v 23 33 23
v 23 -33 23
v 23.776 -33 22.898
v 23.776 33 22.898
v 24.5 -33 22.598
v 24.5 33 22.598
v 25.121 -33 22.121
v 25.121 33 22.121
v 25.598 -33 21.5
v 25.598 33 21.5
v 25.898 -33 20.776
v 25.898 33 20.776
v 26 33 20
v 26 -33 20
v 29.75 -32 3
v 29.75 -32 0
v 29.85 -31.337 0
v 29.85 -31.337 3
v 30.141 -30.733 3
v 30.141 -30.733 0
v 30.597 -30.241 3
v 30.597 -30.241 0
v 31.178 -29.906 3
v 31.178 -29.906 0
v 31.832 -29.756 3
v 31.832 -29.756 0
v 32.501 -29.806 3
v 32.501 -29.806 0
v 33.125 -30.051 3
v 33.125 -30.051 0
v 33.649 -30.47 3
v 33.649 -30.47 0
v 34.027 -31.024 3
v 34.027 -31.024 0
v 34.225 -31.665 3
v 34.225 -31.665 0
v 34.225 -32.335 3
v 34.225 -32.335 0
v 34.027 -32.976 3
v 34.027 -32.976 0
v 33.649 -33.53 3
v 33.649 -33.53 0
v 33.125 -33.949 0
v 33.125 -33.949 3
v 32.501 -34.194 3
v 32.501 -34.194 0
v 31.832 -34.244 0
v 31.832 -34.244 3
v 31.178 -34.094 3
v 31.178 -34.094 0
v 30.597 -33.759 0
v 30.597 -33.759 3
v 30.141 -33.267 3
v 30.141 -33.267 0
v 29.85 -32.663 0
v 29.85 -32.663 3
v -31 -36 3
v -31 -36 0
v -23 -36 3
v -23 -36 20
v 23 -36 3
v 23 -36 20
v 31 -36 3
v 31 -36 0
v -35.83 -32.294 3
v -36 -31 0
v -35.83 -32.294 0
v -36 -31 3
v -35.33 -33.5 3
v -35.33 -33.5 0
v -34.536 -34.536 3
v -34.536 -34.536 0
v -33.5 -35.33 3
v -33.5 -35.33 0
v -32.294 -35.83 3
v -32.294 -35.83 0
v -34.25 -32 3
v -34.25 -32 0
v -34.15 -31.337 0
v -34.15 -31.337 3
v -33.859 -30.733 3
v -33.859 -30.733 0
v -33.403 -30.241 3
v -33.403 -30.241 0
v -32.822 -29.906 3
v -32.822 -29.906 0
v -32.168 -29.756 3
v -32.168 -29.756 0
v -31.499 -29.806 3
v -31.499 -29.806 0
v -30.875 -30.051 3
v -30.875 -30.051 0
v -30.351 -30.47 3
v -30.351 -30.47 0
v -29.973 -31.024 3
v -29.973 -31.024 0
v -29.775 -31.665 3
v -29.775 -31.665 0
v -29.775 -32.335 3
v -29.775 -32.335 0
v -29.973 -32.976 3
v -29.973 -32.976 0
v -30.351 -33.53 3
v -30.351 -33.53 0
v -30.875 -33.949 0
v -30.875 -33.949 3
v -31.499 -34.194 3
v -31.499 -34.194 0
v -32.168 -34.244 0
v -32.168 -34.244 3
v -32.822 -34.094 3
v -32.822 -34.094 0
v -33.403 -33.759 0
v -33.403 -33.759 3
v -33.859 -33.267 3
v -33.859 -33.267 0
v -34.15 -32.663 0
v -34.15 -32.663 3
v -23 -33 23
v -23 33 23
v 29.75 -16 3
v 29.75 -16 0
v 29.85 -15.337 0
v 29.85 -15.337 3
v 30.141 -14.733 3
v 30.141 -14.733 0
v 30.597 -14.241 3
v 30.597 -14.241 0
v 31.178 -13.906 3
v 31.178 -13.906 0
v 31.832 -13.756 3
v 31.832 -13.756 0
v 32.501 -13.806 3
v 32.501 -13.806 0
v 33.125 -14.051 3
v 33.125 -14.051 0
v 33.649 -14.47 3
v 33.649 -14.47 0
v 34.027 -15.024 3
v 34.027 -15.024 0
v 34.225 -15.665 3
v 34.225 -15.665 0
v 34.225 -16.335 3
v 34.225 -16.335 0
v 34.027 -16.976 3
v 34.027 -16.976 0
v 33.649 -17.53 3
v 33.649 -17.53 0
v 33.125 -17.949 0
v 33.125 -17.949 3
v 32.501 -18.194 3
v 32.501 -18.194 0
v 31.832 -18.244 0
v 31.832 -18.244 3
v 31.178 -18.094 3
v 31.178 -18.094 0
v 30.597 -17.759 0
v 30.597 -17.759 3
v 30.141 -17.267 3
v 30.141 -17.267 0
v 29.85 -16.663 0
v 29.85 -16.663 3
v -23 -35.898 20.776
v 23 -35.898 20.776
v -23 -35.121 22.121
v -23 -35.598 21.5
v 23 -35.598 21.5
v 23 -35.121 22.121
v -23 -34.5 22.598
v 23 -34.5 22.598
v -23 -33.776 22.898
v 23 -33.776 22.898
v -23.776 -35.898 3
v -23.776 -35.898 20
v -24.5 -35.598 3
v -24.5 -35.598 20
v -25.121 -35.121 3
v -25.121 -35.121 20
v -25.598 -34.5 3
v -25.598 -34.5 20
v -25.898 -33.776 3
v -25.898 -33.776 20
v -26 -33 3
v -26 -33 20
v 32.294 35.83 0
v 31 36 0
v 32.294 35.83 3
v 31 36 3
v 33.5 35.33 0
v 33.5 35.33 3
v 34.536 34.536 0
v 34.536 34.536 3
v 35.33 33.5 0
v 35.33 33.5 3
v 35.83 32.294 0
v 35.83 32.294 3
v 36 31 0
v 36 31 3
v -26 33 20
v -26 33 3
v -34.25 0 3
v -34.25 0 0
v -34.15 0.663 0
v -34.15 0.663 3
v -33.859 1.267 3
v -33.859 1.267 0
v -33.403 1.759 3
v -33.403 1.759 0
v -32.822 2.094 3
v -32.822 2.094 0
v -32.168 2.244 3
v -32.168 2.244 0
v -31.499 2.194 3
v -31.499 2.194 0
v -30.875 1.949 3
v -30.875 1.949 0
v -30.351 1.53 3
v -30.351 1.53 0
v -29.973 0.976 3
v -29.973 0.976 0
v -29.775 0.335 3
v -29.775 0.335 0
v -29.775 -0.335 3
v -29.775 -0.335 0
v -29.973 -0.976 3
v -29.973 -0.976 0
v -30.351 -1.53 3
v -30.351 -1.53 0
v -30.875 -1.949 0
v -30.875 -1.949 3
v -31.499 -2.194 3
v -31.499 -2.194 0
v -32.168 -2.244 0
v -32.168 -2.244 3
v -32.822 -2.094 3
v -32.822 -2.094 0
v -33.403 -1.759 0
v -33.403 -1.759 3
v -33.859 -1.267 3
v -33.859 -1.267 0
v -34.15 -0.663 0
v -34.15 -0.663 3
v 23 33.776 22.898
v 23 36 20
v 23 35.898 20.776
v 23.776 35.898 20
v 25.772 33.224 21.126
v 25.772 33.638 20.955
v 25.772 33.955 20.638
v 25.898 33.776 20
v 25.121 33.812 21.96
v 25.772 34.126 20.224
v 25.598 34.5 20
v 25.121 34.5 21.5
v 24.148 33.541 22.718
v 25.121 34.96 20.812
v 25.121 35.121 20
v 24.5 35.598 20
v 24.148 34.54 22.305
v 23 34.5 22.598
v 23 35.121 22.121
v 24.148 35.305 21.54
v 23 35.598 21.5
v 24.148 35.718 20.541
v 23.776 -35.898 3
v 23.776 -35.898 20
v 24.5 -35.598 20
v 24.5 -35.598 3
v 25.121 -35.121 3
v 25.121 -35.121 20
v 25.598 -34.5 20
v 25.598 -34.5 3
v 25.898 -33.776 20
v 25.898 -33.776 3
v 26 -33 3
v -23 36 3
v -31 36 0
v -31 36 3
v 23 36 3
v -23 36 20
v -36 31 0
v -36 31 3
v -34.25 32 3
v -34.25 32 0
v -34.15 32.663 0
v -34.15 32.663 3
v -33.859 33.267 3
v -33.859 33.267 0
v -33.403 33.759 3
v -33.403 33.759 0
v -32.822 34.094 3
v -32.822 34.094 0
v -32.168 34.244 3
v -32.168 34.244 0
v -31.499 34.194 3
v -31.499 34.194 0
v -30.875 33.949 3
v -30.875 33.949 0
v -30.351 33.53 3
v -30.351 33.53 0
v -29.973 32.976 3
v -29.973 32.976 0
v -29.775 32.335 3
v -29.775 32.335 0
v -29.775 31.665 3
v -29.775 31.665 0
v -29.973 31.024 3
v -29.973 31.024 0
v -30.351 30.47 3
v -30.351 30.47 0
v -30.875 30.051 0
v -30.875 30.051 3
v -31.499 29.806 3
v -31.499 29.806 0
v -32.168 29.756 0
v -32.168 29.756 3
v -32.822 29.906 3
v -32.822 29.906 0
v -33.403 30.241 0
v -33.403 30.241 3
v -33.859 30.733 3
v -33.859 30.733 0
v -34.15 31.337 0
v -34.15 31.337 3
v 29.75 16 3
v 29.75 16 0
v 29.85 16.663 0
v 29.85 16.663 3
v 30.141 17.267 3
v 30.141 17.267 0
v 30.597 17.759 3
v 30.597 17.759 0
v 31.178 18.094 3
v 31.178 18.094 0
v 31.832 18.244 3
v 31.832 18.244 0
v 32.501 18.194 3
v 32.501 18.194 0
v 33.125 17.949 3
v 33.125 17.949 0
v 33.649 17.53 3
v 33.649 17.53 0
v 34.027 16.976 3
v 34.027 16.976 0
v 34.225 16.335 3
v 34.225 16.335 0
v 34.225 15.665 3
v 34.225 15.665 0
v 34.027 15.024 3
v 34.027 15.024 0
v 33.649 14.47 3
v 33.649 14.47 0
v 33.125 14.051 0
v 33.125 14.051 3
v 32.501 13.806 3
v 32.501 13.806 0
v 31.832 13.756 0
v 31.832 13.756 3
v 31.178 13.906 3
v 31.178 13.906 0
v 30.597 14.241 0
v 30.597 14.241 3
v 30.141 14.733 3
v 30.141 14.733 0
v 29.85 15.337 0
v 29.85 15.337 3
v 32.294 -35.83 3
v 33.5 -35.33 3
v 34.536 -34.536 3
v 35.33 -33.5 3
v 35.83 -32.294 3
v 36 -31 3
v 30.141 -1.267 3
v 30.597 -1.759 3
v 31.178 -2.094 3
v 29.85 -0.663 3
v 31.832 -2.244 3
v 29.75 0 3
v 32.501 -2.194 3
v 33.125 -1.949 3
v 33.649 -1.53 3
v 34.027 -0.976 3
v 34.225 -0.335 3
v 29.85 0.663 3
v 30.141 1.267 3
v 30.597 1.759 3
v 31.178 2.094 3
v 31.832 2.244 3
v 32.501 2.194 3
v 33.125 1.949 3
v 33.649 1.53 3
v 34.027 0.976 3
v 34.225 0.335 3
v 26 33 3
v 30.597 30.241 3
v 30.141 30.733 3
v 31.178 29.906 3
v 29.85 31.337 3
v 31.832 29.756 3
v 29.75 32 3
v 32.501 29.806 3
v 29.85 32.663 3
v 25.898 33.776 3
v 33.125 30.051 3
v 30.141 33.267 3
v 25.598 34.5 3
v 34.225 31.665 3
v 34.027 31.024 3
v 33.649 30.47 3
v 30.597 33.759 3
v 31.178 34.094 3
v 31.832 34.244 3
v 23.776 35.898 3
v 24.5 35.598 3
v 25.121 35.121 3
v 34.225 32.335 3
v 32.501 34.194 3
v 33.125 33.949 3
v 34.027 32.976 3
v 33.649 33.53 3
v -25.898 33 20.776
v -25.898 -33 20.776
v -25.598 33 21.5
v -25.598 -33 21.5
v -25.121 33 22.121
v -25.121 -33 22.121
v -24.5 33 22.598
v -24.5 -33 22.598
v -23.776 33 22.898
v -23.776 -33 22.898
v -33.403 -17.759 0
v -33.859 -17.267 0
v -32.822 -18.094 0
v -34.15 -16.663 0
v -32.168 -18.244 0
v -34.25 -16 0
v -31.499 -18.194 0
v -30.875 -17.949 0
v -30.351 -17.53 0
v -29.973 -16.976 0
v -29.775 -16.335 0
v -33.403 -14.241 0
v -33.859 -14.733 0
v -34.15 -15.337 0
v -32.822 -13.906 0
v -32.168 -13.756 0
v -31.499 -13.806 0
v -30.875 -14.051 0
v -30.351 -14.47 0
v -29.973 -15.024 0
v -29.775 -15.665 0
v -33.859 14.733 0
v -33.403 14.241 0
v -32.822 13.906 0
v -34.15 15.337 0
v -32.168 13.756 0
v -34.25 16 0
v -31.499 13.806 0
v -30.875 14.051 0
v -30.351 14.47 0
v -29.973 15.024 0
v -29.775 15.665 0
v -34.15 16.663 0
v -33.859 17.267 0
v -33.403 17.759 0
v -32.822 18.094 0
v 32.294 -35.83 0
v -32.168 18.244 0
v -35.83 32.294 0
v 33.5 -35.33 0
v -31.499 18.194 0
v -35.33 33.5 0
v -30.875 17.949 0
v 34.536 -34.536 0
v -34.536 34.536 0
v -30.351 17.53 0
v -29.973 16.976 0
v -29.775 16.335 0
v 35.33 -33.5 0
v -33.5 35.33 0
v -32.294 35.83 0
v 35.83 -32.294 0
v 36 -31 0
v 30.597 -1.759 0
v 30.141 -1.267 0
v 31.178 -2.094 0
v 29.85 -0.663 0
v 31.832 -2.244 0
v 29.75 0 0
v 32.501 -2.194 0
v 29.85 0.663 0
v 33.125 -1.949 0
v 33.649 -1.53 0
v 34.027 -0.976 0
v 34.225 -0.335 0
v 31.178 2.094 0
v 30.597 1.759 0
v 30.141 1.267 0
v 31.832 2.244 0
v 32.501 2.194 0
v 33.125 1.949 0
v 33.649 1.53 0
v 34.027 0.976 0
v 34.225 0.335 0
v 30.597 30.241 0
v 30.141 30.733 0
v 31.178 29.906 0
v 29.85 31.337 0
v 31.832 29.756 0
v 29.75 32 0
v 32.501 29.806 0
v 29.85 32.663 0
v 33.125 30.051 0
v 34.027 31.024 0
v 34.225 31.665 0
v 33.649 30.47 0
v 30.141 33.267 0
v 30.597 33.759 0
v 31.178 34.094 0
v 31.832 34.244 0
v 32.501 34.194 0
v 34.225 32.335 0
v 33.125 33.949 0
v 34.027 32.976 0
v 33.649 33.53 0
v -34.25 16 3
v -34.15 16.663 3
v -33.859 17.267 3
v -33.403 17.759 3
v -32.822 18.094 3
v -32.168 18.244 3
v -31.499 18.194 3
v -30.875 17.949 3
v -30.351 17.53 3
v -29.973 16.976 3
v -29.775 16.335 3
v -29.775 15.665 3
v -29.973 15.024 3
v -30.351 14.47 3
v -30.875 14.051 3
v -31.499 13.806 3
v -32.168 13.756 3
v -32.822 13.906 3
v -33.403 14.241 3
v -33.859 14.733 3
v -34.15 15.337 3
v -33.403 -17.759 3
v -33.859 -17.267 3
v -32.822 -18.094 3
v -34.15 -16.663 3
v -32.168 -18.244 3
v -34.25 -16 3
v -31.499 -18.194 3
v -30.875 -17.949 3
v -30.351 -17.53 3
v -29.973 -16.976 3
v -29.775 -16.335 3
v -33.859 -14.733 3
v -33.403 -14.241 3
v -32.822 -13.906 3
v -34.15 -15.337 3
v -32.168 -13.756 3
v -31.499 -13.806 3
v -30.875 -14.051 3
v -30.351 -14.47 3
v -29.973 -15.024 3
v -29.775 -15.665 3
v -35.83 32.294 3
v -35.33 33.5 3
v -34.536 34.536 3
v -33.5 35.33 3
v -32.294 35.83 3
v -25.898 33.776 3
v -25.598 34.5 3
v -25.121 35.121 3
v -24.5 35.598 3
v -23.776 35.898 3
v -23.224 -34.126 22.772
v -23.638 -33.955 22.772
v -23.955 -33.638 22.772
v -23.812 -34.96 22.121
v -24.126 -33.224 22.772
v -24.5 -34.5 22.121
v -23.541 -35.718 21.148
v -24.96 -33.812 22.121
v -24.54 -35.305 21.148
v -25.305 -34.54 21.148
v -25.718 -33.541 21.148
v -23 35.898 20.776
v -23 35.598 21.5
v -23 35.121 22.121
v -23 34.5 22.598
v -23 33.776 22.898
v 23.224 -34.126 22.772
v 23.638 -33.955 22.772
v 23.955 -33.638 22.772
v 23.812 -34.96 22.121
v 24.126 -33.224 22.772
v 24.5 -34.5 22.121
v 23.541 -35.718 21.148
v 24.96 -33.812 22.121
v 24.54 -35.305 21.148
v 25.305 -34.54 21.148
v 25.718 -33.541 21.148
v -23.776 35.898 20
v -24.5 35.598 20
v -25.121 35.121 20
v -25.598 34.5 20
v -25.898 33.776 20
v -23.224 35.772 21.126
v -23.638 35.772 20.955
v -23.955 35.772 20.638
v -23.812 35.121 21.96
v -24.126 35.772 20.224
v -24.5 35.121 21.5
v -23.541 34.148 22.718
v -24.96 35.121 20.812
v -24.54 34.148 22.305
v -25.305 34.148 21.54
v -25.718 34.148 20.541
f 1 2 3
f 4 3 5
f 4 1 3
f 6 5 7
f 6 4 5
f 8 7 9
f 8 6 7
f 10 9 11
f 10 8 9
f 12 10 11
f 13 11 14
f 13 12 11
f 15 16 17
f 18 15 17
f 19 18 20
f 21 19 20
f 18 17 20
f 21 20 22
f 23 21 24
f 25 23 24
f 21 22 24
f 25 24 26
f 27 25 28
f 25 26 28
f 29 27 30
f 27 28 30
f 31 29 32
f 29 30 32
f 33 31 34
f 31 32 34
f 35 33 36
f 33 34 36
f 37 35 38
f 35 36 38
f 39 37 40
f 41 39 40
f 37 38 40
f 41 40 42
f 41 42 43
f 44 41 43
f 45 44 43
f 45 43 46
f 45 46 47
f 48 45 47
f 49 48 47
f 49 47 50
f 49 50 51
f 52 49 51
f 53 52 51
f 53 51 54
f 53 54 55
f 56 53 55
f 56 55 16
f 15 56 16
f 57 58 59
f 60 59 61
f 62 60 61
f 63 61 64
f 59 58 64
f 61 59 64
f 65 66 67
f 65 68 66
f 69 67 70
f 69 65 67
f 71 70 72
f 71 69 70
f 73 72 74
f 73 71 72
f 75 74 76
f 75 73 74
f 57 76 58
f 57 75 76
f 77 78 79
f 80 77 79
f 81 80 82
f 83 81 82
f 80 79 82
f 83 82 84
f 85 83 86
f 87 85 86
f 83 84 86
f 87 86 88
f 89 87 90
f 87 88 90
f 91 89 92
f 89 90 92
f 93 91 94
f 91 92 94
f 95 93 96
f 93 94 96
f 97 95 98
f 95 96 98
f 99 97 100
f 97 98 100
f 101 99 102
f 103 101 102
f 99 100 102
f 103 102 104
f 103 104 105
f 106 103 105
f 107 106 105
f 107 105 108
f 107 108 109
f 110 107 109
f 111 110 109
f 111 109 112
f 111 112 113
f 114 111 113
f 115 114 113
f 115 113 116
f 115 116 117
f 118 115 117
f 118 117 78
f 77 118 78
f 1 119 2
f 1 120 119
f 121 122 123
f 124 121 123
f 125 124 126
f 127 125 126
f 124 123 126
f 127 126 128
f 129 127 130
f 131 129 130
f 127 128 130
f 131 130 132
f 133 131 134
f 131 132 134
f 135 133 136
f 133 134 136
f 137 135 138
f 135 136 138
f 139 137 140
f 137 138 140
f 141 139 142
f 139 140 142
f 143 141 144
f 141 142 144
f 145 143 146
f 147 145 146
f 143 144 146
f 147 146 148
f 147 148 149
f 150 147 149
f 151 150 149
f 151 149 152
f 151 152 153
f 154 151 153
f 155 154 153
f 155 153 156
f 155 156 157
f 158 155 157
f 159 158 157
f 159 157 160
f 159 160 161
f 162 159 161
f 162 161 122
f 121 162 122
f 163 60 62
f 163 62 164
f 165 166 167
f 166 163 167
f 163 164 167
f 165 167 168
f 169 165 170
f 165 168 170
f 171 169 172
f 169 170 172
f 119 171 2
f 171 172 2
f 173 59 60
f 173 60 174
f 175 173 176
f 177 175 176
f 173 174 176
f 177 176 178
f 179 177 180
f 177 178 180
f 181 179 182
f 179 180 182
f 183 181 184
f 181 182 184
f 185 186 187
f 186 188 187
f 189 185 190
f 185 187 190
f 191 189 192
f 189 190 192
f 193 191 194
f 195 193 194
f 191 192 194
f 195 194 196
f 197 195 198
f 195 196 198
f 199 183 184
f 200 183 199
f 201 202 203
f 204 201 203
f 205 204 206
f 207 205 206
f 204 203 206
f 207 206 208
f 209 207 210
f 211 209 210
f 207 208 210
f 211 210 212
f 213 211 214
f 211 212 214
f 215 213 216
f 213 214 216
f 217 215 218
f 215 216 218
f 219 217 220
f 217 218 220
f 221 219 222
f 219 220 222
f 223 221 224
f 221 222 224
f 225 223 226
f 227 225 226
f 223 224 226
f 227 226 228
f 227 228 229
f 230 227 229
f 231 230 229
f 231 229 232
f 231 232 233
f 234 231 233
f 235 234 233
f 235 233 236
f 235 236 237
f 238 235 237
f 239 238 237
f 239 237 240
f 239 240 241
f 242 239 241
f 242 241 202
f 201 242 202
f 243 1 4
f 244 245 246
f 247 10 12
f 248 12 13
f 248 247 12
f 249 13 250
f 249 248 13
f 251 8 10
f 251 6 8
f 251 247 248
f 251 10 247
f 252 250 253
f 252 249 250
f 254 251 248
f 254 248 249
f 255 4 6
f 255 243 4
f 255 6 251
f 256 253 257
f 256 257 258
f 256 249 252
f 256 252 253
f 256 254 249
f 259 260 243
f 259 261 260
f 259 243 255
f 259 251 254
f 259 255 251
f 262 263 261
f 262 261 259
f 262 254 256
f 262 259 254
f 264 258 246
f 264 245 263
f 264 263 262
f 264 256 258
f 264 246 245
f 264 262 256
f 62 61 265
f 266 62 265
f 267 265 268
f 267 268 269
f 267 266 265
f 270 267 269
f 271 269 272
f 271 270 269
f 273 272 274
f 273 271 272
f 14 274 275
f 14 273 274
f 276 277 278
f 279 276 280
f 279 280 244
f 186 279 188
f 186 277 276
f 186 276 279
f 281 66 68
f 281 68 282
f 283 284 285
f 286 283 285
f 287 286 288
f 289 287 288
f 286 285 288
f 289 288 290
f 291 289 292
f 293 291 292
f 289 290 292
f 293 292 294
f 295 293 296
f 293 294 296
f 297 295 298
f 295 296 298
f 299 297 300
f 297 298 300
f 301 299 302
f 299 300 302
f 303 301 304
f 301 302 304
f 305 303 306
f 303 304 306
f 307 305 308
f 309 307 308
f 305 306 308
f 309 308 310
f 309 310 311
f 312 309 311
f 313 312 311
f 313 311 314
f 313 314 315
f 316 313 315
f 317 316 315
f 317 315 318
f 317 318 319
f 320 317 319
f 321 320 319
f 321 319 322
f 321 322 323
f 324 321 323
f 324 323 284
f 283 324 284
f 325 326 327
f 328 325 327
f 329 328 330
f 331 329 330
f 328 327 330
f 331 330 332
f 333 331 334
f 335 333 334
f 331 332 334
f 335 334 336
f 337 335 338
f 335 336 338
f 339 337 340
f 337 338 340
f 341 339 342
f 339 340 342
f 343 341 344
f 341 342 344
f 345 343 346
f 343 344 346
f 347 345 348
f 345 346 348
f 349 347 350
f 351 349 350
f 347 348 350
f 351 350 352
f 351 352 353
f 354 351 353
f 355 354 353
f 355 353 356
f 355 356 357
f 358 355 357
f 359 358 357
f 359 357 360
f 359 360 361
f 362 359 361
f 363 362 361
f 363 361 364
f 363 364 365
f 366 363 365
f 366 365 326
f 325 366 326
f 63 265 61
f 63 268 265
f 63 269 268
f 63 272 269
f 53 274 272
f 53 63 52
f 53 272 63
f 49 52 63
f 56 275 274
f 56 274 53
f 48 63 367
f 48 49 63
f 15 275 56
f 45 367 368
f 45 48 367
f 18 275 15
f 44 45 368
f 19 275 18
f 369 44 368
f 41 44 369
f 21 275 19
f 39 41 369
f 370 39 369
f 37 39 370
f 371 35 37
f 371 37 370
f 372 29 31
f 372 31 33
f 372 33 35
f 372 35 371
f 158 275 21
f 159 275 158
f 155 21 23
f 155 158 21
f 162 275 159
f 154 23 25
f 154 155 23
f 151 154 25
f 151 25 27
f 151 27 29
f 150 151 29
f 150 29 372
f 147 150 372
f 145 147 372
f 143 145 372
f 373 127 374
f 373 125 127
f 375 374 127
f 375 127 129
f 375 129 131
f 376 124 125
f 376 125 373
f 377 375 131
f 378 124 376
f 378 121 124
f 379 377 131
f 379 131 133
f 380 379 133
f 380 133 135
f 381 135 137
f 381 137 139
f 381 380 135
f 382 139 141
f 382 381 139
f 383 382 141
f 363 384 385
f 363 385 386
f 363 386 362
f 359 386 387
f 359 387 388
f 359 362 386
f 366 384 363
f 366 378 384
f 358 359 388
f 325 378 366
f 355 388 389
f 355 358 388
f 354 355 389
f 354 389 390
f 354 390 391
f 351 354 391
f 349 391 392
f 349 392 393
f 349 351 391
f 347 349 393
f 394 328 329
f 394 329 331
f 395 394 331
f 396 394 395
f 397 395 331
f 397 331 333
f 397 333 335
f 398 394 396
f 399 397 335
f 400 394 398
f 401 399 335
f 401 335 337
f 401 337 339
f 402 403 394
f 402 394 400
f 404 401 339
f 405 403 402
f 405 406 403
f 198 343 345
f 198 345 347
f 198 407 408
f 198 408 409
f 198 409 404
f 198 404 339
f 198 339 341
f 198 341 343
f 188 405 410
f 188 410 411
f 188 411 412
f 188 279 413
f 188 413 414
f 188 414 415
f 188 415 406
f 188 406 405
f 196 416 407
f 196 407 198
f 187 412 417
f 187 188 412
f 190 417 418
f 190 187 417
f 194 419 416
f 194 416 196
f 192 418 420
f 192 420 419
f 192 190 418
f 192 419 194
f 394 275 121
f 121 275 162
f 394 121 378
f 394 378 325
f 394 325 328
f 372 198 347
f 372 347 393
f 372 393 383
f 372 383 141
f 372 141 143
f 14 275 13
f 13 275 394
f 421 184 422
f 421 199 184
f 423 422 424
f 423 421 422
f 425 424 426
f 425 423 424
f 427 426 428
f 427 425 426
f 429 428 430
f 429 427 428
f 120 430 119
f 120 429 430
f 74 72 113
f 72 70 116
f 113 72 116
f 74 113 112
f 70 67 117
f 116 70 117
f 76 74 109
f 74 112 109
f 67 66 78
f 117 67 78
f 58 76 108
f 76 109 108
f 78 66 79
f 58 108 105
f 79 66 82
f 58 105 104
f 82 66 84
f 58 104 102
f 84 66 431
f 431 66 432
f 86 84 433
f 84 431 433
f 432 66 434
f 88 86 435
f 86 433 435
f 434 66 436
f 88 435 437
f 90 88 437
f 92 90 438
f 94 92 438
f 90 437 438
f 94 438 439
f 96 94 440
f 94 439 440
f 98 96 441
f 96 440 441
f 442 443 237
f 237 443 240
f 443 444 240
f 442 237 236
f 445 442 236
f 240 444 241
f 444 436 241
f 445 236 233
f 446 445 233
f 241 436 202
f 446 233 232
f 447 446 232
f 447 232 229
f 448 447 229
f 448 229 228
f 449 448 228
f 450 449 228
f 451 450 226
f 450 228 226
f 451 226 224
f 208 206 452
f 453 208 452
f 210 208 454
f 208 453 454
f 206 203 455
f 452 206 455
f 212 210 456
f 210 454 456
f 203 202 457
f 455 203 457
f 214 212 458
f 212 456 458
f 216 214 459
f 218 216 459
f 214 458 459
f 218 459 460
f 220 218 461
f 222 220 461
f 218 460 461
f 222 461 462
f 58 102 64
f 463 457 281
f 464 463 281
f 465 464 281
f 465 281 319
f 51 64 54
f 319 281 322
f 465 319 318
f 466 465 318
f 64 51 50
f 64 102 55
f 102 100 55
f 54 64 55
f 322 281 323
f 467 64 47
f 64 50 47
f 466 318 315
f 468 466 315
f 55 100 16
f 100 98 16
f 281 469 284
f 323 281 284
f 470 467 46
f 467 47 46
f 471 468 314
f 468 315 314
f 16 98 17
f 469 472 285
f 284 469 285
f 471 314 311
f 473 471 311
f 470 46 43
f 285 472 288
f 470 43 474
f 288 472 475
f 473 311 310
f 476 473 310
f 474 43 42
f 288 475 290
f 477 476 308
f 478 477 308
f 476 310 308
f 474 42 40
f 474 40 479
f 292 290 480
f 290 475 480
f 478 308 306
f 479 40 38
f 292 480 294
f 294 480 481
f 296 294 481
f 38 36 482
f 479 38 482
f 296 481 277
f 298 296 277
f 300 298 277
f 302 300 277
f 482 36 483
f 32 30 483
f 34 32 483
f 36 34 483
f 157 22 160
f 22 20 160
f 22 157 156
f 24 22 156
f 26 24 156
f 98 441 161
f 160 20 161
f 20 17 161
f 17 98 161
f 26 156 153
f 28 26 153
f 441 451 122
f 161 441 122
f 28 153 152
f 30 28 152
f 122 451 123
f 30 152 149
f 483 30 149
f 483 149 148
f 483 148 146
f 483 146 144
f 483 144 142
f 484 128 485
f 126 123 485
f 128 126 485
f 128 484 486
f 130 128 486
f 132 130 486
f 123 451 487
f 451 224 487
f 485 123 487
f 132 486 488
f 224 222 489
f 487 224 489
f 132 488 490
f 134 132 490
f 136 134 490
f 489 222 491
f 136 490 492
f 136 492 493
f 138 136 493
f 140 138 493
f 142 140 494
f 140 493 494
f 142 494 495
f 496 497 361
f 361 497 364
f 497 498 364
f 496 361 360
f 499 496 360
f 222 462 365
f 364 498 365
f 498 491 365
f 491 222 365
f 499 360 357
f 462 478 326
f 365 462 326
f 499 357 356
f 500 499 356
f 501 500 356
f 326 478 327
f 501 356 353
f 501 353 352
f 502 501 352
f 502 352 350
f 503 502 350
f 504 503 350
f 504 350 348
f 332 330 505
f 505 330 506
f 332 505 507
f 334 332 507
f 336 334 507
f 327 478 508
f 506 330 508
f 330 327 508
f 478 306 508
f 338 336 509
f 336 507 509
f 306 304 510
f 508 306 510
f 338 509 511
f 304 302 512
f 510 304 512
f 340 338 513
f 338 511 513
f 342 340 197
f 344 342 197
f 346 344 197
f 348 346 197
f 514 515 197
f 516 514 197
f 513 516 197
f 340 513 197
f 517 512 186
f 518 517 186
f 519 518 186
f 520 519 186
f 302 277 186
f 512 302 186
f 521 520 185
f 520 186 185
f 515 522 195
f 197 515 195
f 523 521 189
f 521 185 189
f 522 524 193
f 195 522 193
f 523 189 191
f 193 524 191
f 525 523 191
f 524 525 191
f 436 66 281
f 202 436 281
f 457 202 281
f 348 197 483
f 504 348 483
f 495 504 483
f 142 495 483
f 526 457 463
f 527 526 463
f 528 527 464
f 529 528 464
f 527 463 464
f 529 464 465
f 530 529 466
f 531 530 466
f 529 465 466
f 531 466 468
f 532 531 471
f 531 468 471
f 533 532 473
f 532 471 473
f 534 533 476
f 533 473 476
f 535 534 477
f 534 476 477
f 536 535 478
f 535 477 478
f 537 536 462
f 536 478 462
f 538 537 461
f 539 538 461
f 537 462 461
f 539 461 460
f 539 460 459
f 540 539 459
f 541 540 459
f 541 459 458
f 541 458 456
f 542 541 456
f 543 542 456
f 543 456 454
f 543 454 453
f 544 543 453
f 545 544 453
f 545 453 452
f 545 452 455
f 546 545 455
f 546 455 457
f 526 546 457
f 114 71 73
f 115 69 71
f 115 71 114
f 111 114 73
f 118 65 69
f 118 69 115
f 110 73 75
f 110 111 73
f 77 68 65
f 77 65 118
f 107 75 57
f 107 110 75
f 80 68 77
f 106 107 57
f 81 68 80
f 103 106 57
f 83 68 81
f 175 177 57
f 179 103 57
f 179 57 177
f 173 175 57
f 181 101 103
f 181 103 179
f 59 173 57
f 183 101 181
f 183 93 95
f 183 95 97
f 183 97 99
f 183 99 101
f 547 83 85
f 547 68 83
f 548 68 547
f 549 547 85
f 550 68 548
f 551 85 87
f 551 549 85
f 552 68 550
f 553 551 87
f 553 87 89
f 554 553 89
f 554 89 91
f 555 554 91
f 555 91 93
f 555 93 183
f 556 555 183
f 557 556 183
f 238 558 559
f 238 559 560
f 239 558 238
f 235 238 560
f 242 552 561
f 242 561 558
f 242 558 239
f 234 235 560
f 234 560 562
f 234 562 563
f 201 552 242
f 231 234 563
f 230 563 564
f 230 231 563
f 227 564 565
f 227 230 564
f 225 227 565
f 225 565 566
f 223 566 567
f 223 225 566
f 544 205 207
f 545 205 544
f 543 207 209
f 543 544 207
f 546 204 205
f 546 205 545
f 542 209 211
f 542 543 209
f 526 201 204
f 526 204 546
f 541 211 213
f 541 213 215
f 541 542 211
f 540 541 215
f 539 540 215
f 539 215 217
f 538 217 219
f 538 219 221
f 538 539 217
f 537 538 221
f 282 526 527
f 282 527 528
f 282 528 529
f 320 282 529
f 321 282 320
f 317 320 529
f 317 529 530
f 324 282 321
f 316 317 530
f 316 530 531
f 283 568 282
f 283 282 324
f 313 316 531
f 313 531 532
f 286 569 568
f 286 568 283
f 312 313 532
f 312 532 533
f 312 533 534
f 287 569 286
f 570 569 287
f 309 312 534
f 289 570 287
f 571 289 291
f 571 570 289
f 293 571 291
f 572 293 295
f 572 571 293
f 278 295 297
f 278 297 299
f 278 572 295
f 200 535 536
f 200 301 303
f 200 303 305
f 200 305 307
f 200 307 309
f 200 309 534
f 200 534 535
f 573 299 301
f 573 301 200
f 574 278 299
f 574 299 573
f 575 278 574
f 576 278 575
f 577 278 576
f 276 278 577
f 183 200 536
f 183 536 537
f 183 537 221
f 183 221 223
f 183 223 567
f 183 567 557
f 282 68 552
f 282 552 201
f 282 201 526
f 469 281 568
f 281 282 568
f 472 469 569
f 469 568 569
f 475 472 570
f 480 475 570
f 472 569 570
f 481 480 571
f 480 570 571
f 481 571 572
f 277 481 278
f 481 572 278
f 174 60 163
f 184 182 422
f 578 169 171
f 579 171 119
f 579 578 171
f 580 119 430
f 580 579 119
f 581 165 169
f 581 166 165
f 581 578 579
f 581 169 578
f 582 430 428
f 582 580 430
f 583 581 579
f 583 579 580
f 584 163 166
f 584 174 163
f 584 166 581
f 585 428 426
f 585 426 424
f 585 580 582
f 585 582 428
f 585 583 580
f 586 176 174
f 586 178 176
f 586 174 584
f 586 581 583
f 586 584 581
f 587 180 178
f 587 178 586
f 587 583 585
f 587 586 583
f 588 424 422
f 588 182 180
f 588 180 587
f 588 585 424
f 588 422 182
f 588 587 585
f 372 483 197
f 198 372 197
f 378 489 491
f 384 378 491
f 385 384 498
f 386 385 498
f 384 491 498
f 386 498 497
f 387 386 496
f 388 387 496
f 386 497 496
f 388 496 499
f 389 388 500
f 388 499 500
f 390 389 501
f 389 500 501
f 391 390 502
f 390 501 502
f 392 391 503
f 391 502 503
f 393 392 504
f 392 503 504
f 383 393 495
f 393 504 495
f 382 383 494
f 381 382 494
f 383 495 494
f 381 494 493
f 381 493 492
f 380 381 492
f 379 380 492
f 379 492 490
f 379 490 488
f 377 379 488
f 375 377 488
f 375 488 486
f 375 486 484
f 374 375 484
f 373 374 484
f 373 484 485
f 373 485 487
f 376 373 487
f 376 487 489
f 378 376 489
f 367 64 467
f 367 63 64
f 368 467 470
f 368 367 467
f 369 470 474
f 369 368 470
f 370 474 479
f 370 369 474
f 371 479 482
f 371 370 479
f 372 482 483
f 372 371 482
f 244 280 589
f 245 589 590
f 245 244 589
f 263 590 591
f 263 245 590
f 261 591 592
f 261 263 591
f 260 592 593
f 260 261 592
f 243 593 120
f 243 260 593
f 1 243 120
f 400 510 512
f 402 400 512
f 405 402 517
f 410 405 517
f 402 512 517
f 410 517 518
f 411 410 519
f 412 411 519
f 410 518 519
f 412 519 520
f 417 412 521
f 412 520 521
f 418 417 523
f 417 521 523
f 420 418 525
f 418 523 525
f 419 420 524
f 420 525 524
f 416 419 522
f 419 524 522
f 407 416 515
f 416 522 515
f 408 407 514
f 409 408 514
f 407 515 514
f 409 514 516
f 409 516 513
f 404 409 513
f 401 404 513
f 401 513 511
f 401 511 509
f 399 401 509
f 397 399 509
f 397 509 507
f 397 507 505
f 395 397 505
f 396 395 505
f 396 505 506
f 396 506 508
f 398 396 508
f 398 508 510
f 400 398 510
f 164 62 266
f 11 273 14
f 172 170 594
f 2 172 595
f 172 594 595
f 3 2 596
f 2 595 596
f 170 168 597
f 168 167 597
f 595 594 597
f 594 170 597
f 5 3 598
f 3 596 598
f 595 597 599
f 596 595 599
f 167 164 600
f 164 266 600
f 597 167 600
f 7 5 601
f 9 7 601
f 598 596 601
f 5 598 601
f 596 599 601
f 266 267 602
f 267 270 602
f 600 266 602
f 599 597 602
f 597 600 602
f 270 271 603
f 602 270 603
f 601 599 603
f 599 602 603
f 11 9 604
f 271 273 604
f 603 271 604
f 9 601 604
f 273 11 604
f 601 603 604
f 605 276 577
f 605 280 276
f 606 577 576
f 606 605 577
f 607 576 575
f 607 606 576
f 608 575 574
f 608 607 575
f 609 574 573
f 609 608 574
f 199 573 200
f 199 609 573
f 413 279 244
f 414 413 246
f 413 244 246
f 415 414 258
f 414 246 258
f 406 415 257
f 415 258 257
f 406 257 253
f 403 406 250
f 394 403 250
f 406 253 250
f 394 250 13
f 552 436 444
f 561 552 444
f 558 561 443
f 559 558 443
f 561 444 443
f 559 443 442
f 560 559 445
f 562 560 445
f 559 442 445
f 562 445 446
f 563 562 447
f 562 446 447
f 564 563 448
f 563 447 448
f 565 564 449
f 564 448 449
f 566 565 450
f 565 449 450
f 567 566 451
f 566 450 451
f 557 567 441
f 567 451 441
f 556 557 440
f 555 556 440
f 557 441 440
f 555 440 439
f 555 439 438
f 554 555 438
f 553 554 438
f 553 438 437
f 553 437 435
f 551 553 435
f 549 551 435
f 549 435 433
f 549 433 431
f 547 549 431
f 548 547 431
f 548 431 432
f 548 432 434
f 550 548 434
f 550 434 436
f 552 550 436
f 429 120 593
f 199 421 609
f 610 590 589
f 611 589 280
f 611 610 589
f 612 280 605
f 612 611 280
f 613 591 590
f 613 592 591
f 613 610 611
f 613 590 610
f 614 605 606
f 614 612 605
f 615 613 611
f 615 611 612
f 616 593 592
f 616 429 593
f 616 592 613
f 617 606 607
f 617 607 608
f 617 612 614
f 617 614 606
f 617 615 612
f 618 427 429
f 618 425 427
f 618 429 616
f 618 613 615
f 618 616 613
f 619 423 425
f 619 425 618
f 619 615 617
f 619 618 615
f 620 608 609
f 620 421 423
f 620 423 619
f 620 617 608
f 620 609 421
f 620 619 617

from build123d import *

# Parameters (mm, degrees)
F0_W     = 72
F0_H     = 72
F1_DEPTH = 3
F2_W     = 52
F2_H     = 72
F3_DEPTH = 20
F5_D     = 4.5
F7_D     = 4.5
F8_R     = 5
F9_R     = 3


with BuildPart() as f1:
    # F0 (on Top) → F1 (new body)
    with BuildSketch(Plane.XY):
        Rectangle(F0_W, F0_H)
    extrude(amount=F1_DEPTH)

    # F2 (on face) → F3 (join)
    with BuildSketch(Plane.XY.offset(3)):
        Rectangle(F2_W, F2_H)
    extrude(amount=F3_DEPTH)

    # F5 (through all)
    with Locations(Plane.XY.offset(3)):
        with Locations((32, 32), (32, 16), (32, 0), (32, -16), (32, -32)):
            Hole(F5_D / 2)

    # F7 (through all)
    with Locations(Plane.XY.offset(3)):
        with Locations((-32, 32), (-32, 16), (-32, 0), (-32, -16), (-32, -32)):
            Hole(F7_D / 2)

    # F8
    f8_edges = [f1.edges().sort_by_distance(p)[0] for p in [
        (-36, 36, 1.5),
        (-36, -36, 1.5),
        (36, -36, 1.5),
        (36, 36, 1.5),
    ]]
    fillet(f8_edges, radius=F8_R)

    # F9
    f9_edges = [f1.edges().sort_by_distance(p)[0] for p in [
        (-26, -36, 13),
        (26, -36, 13),
        (0, -36, 23),
        (-26, 0, 23),
        (0, 36, 23),
        (26, 0, 23),
        (26, 36, 13),
        (-26, 36, 13),
    ]]
    fillet(f9_edges, radius=F9_R)


solid = f1.part
